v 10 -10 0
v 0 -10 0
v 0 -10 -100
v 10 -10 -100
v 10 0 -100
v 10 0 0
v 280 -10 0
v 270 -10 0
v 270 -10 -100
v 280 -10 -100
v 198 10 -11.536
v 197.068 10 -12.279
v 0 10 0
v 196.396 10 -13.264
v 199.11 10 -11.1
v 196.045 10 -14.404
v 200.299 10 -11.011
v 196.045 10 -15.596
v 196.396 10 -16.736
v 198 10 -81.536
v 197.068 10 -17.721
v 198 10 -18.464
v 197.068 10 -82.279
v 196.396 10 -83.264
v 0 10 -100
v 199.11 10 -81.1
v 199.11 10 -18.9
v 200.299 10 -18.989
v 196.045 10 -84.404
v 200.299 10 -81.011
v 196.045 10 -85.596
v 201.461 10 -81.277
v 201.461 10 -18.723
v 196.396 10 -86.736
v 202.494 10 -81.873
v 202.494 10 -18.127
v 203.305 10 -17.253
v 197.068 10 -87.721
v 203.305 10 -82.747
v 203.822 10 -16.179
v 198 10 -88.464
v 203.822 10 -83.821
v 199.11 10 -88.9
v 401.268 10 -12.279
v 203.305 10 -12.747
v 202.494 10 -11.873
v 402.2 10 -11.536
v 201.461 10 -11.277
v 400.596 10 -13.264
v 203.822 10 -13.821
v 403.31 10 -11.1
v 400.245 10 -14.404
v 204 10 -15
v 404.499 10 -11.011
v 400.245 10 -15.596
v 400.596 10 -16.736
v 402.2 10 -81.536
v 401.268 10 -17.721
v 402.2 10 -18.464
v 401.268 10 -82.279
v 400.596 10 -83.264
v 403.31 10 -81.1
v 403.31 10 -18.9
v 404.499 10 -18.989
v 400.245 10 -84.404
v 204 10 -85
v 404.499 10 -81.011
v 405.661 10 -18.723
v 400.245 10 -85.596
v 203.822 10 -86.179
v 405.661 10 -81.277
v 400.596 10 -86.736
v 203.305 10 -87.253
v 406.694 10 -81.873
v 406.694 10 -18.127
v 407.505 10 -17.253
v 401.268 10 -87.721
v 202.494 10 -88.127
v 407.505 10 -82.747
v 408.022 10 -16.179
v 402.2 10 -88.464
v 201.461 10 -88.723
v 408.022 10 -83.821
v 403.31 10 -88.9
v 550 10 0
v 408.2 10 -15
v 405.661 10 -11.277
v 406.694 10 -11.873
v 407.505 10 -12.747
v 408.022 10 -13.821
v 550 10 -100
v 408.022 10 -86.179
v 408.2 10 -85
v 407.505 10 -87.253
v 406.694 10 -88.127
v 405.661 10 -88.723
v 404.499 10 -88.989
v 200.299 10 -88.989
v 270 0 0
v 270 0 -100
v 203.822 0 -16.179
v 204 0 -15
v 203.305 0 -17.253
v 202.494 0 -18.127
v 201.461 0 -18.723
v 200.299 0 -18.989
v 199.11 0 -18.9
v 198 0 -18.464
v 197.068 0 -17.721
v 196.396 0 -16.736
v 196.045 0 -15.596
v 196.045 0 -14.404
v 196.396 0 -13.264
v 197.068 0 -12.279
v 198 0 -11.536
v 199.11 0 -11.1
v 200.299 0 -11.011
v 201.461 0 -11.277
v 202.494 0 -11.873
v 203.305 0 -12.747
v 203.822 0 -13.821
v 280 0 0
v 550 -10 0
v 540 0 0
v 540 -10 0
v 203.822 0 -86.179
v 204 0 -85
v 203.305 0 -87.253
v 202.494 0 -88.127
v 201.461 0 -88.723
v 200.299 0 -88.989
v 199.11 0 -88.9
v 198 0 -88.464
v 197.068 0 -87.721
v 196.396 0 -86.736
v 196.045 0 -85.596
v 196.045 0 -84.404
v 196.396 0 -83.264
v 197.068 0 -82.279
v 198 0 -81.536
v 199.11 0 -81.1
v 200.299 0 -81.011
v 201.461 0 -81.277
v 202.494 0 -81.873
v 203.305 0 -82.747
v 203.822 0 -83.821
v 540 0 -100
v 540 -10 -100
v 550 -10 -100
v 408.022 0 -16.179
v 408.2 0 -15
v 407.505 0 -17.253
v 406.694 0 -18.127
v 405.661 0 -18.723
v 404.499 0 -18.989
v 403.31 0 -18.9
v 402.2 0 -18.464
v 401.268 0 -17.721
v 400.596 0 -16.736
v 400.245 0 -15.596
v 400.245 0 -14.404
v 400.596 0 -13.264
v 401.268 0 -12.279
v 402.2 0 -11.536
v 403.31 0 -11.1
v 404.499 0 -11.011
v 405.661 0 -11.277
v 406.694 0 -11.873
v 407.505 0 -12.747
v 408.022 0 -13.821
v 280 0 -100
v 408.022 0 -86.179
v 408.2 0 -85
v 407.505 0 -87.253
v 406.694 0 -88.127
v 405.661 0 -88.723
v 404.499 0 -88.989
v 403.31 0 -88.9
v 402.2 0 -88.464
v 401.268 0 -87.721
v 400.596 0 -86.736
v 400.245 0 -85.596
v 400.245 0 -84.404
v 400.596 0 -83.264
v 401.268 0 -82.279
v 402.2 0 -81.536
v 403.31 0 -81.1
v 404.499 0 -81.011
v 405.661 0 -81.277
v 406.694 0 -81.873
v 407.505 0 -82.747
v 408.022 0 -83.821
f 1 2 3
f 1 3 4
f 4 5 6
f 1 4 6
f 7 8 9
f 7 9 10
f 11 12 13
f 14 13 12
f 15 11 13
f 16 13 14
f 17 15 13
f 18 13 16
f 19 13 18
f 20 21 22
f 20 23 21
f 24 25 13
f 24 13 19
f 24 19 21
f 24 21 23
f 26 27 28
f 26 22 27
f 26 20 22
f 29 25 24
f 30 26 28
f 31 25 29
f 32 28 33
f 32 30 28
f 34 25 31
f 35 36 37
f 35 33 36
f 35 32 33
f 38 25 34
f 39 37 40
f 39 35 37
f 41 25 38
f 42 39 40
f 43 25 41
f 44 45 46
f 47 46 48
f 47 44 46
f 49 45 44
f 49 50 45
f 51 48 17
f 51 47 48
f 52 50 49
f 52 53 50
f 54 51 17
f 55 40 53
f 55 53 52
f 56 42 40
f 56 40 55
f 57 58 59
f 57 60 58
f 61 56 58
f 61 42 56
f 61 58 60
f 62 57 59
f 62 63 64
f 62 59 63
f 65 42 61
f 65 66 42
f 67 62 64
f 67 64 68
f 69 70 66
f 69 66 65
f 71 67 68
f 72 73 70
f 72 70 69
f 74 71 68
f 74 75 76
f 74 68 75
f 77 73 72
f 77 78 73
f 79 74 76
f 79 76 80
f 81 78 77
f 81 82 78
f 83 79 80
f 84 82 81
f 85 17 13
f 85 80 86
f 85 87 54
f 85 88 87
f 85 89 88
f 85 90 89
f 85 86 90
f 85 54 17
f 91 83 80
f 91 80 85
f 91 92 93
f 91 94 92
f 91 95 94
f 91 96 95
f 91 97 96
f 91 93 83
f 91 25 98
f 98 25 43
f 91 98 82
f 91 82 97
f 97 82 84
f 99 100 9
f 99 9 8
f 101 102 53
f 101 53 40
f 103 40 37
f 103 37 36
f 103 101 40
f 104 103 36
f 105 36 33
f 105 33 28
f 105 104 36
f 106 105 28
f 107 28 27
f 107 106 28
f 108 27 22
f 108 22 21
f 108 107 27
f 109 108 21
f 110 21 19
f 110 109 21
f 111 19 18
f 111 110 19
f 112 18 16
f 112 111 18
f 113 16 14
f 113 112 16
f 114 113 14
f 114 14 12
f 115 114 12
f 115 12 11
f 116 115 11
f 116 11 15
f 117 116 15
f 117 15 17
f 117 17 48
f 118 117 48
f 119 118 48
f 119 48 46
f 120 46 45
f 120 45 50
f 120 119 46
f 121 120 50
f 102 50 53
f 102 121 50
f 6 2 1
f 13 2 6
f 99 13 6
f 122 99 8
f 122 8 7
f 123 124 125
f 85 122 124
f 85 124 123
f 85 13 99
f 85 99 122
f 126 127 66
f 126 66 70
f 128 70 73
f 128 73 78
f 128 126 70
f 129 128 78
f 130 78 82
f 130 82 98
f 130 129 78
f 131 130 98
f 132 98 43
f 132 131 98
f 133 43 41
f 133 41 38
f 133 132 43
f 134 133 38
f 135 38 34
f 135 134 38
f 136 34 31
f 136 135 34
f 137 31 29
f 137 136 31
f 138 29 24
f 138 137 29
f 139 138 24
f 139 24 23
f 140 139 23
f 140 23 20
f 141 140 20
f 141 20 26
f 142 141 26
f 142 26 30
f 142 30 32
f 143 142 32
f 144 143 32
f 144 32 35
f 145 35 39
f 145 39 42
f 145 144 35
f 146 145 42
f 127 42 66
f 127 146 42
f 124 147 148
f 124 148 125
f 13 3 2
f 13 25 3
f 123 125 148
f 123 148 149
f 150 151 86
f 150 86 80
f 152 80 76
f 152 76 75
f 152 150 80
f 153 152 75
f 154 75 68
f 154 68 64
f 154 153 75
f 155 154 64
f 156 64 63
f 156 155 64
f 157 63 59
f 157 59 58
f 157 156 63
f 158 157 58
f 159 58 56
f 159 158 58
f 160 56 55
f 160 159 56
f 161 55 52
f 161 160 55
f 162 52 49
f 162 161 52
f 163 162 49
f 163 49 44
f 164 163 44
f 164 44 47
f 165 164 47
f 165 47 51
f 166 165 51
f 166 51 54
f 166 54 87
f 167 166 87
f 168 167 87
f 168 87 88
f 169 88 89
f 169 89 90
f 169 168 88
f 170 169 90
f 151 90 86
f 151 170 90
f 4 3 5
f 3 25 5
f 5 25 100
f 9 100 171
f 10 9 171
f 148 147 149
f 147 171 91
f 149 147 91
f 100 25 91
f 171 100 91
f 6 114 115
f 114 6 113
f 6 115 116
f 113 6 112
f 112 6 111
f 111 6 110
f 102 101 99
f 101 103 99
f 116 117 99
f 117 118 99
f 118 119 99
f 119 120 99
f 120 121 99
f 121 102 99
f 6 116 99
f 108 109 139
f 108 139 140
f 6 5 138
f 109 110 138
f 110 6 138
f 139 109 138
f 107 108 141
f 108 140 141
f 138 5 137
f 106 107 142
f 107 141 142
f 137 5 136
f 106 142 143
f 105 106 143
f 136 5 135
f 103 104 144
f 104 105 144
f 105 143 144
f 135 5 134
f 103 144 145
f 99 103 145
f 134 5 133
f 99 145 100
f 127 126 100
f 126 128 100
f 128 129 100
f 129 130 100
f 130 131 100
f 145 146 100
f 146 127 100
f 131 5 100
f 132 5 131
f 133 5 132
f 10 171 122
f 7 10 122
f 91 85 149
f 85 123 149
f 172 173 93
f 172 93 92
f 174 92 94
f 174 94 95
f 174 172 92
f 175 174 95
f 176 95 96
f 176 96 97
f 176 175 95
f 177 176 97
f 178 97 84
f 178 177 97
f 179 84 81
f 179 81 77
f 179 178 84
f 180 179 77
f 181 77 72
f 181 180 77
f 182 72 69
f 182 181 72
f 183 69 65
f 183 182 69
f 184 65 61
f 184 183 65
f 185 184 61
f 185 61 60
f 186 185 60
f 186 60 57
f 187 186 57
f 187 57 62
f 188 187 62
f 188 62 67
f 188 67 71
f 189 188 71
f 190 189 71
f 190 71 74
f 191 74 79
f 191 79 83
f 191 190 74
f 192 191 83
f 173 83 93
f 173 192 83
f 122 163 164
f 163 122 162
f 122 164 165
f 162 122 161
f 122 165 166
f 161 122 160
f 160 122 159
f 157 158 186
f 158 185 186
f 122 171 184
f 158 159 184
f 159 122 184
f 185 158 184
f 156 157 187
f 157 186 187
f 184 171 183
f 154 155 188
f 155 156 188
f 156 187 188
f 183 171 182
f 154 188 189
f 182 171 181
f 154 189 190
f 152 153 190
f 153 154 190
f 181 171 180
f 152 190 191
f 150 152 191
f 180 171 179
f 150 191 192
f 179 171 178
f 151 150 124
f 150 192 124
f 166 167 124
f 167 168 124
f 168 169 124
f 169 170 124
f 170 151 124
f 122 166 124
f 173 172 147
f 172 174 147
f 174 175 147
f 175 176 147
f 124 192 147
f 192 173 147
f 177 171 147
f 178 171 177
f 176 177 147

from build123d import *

# Parameters (mm, degrees)
SCHIZZO1_W                   = 550
SCHIZZO1_H                   = 100
SCHIZZO1_R                   = 4
ESTRUSIONE_ESTRUSIONE1_DEPTH = 10
SCHIZZO2_W                   = 10
SCHIZZO2_H                   = 100
ESTRUSIONE_ESTRUSIONE2_DEPTH = 10


with BuildPart() as part:
    # Schizzo1 → Estrusione-Estrusione1 (new body)
    with BuildSketch(Plane(origin=(0, 0, 0), x_dir=(1, 0, 0), z_dir=(0, 1, 0))):
        with Locations((275, 50)):
            Rectangle(SCHIZZO1_W, SCHIZZO1_H)
        with Locations((200, 85)):
            Circle(SCHIZZO1_R, mode=Mode.SUBTRACT)
        with Locations((200, 15)):
            Circle(SCHIZZO1_R, mode=Mode.SUBTRACT)
        with Locations((404.2, 15)):
            Circle(SCHIZZO1_R, mode=Mode.SUBTRACT)
        with Locations((404.2, 85)):
            Circle(SCHIZZO1_R, mode=Mode.SUBTRACT)
    extrude(amount=ESTRUSIONE_ESTRUSIONE1_DEPTH)

    # Schizzo2 → Estrusione-Estrusione2 (add)
    with BuildSketch(Plane.XZ):
        with Locations((5, -50)):
            Rectangle(SCHIZZO2_W, SCHIZZO2_H)
        with Locations((545, -50)):
            Rectangle(SCHIZZO2_W, SCHIZZO2_H)
        with Locations((275, -50)):
            Rectangle(SCHIZZO2_W, SCHIZZO2_H)
    extrude(amount=ESTRUSIONE_ESTRUSIONE2_DEPTH)


solid = part.part
